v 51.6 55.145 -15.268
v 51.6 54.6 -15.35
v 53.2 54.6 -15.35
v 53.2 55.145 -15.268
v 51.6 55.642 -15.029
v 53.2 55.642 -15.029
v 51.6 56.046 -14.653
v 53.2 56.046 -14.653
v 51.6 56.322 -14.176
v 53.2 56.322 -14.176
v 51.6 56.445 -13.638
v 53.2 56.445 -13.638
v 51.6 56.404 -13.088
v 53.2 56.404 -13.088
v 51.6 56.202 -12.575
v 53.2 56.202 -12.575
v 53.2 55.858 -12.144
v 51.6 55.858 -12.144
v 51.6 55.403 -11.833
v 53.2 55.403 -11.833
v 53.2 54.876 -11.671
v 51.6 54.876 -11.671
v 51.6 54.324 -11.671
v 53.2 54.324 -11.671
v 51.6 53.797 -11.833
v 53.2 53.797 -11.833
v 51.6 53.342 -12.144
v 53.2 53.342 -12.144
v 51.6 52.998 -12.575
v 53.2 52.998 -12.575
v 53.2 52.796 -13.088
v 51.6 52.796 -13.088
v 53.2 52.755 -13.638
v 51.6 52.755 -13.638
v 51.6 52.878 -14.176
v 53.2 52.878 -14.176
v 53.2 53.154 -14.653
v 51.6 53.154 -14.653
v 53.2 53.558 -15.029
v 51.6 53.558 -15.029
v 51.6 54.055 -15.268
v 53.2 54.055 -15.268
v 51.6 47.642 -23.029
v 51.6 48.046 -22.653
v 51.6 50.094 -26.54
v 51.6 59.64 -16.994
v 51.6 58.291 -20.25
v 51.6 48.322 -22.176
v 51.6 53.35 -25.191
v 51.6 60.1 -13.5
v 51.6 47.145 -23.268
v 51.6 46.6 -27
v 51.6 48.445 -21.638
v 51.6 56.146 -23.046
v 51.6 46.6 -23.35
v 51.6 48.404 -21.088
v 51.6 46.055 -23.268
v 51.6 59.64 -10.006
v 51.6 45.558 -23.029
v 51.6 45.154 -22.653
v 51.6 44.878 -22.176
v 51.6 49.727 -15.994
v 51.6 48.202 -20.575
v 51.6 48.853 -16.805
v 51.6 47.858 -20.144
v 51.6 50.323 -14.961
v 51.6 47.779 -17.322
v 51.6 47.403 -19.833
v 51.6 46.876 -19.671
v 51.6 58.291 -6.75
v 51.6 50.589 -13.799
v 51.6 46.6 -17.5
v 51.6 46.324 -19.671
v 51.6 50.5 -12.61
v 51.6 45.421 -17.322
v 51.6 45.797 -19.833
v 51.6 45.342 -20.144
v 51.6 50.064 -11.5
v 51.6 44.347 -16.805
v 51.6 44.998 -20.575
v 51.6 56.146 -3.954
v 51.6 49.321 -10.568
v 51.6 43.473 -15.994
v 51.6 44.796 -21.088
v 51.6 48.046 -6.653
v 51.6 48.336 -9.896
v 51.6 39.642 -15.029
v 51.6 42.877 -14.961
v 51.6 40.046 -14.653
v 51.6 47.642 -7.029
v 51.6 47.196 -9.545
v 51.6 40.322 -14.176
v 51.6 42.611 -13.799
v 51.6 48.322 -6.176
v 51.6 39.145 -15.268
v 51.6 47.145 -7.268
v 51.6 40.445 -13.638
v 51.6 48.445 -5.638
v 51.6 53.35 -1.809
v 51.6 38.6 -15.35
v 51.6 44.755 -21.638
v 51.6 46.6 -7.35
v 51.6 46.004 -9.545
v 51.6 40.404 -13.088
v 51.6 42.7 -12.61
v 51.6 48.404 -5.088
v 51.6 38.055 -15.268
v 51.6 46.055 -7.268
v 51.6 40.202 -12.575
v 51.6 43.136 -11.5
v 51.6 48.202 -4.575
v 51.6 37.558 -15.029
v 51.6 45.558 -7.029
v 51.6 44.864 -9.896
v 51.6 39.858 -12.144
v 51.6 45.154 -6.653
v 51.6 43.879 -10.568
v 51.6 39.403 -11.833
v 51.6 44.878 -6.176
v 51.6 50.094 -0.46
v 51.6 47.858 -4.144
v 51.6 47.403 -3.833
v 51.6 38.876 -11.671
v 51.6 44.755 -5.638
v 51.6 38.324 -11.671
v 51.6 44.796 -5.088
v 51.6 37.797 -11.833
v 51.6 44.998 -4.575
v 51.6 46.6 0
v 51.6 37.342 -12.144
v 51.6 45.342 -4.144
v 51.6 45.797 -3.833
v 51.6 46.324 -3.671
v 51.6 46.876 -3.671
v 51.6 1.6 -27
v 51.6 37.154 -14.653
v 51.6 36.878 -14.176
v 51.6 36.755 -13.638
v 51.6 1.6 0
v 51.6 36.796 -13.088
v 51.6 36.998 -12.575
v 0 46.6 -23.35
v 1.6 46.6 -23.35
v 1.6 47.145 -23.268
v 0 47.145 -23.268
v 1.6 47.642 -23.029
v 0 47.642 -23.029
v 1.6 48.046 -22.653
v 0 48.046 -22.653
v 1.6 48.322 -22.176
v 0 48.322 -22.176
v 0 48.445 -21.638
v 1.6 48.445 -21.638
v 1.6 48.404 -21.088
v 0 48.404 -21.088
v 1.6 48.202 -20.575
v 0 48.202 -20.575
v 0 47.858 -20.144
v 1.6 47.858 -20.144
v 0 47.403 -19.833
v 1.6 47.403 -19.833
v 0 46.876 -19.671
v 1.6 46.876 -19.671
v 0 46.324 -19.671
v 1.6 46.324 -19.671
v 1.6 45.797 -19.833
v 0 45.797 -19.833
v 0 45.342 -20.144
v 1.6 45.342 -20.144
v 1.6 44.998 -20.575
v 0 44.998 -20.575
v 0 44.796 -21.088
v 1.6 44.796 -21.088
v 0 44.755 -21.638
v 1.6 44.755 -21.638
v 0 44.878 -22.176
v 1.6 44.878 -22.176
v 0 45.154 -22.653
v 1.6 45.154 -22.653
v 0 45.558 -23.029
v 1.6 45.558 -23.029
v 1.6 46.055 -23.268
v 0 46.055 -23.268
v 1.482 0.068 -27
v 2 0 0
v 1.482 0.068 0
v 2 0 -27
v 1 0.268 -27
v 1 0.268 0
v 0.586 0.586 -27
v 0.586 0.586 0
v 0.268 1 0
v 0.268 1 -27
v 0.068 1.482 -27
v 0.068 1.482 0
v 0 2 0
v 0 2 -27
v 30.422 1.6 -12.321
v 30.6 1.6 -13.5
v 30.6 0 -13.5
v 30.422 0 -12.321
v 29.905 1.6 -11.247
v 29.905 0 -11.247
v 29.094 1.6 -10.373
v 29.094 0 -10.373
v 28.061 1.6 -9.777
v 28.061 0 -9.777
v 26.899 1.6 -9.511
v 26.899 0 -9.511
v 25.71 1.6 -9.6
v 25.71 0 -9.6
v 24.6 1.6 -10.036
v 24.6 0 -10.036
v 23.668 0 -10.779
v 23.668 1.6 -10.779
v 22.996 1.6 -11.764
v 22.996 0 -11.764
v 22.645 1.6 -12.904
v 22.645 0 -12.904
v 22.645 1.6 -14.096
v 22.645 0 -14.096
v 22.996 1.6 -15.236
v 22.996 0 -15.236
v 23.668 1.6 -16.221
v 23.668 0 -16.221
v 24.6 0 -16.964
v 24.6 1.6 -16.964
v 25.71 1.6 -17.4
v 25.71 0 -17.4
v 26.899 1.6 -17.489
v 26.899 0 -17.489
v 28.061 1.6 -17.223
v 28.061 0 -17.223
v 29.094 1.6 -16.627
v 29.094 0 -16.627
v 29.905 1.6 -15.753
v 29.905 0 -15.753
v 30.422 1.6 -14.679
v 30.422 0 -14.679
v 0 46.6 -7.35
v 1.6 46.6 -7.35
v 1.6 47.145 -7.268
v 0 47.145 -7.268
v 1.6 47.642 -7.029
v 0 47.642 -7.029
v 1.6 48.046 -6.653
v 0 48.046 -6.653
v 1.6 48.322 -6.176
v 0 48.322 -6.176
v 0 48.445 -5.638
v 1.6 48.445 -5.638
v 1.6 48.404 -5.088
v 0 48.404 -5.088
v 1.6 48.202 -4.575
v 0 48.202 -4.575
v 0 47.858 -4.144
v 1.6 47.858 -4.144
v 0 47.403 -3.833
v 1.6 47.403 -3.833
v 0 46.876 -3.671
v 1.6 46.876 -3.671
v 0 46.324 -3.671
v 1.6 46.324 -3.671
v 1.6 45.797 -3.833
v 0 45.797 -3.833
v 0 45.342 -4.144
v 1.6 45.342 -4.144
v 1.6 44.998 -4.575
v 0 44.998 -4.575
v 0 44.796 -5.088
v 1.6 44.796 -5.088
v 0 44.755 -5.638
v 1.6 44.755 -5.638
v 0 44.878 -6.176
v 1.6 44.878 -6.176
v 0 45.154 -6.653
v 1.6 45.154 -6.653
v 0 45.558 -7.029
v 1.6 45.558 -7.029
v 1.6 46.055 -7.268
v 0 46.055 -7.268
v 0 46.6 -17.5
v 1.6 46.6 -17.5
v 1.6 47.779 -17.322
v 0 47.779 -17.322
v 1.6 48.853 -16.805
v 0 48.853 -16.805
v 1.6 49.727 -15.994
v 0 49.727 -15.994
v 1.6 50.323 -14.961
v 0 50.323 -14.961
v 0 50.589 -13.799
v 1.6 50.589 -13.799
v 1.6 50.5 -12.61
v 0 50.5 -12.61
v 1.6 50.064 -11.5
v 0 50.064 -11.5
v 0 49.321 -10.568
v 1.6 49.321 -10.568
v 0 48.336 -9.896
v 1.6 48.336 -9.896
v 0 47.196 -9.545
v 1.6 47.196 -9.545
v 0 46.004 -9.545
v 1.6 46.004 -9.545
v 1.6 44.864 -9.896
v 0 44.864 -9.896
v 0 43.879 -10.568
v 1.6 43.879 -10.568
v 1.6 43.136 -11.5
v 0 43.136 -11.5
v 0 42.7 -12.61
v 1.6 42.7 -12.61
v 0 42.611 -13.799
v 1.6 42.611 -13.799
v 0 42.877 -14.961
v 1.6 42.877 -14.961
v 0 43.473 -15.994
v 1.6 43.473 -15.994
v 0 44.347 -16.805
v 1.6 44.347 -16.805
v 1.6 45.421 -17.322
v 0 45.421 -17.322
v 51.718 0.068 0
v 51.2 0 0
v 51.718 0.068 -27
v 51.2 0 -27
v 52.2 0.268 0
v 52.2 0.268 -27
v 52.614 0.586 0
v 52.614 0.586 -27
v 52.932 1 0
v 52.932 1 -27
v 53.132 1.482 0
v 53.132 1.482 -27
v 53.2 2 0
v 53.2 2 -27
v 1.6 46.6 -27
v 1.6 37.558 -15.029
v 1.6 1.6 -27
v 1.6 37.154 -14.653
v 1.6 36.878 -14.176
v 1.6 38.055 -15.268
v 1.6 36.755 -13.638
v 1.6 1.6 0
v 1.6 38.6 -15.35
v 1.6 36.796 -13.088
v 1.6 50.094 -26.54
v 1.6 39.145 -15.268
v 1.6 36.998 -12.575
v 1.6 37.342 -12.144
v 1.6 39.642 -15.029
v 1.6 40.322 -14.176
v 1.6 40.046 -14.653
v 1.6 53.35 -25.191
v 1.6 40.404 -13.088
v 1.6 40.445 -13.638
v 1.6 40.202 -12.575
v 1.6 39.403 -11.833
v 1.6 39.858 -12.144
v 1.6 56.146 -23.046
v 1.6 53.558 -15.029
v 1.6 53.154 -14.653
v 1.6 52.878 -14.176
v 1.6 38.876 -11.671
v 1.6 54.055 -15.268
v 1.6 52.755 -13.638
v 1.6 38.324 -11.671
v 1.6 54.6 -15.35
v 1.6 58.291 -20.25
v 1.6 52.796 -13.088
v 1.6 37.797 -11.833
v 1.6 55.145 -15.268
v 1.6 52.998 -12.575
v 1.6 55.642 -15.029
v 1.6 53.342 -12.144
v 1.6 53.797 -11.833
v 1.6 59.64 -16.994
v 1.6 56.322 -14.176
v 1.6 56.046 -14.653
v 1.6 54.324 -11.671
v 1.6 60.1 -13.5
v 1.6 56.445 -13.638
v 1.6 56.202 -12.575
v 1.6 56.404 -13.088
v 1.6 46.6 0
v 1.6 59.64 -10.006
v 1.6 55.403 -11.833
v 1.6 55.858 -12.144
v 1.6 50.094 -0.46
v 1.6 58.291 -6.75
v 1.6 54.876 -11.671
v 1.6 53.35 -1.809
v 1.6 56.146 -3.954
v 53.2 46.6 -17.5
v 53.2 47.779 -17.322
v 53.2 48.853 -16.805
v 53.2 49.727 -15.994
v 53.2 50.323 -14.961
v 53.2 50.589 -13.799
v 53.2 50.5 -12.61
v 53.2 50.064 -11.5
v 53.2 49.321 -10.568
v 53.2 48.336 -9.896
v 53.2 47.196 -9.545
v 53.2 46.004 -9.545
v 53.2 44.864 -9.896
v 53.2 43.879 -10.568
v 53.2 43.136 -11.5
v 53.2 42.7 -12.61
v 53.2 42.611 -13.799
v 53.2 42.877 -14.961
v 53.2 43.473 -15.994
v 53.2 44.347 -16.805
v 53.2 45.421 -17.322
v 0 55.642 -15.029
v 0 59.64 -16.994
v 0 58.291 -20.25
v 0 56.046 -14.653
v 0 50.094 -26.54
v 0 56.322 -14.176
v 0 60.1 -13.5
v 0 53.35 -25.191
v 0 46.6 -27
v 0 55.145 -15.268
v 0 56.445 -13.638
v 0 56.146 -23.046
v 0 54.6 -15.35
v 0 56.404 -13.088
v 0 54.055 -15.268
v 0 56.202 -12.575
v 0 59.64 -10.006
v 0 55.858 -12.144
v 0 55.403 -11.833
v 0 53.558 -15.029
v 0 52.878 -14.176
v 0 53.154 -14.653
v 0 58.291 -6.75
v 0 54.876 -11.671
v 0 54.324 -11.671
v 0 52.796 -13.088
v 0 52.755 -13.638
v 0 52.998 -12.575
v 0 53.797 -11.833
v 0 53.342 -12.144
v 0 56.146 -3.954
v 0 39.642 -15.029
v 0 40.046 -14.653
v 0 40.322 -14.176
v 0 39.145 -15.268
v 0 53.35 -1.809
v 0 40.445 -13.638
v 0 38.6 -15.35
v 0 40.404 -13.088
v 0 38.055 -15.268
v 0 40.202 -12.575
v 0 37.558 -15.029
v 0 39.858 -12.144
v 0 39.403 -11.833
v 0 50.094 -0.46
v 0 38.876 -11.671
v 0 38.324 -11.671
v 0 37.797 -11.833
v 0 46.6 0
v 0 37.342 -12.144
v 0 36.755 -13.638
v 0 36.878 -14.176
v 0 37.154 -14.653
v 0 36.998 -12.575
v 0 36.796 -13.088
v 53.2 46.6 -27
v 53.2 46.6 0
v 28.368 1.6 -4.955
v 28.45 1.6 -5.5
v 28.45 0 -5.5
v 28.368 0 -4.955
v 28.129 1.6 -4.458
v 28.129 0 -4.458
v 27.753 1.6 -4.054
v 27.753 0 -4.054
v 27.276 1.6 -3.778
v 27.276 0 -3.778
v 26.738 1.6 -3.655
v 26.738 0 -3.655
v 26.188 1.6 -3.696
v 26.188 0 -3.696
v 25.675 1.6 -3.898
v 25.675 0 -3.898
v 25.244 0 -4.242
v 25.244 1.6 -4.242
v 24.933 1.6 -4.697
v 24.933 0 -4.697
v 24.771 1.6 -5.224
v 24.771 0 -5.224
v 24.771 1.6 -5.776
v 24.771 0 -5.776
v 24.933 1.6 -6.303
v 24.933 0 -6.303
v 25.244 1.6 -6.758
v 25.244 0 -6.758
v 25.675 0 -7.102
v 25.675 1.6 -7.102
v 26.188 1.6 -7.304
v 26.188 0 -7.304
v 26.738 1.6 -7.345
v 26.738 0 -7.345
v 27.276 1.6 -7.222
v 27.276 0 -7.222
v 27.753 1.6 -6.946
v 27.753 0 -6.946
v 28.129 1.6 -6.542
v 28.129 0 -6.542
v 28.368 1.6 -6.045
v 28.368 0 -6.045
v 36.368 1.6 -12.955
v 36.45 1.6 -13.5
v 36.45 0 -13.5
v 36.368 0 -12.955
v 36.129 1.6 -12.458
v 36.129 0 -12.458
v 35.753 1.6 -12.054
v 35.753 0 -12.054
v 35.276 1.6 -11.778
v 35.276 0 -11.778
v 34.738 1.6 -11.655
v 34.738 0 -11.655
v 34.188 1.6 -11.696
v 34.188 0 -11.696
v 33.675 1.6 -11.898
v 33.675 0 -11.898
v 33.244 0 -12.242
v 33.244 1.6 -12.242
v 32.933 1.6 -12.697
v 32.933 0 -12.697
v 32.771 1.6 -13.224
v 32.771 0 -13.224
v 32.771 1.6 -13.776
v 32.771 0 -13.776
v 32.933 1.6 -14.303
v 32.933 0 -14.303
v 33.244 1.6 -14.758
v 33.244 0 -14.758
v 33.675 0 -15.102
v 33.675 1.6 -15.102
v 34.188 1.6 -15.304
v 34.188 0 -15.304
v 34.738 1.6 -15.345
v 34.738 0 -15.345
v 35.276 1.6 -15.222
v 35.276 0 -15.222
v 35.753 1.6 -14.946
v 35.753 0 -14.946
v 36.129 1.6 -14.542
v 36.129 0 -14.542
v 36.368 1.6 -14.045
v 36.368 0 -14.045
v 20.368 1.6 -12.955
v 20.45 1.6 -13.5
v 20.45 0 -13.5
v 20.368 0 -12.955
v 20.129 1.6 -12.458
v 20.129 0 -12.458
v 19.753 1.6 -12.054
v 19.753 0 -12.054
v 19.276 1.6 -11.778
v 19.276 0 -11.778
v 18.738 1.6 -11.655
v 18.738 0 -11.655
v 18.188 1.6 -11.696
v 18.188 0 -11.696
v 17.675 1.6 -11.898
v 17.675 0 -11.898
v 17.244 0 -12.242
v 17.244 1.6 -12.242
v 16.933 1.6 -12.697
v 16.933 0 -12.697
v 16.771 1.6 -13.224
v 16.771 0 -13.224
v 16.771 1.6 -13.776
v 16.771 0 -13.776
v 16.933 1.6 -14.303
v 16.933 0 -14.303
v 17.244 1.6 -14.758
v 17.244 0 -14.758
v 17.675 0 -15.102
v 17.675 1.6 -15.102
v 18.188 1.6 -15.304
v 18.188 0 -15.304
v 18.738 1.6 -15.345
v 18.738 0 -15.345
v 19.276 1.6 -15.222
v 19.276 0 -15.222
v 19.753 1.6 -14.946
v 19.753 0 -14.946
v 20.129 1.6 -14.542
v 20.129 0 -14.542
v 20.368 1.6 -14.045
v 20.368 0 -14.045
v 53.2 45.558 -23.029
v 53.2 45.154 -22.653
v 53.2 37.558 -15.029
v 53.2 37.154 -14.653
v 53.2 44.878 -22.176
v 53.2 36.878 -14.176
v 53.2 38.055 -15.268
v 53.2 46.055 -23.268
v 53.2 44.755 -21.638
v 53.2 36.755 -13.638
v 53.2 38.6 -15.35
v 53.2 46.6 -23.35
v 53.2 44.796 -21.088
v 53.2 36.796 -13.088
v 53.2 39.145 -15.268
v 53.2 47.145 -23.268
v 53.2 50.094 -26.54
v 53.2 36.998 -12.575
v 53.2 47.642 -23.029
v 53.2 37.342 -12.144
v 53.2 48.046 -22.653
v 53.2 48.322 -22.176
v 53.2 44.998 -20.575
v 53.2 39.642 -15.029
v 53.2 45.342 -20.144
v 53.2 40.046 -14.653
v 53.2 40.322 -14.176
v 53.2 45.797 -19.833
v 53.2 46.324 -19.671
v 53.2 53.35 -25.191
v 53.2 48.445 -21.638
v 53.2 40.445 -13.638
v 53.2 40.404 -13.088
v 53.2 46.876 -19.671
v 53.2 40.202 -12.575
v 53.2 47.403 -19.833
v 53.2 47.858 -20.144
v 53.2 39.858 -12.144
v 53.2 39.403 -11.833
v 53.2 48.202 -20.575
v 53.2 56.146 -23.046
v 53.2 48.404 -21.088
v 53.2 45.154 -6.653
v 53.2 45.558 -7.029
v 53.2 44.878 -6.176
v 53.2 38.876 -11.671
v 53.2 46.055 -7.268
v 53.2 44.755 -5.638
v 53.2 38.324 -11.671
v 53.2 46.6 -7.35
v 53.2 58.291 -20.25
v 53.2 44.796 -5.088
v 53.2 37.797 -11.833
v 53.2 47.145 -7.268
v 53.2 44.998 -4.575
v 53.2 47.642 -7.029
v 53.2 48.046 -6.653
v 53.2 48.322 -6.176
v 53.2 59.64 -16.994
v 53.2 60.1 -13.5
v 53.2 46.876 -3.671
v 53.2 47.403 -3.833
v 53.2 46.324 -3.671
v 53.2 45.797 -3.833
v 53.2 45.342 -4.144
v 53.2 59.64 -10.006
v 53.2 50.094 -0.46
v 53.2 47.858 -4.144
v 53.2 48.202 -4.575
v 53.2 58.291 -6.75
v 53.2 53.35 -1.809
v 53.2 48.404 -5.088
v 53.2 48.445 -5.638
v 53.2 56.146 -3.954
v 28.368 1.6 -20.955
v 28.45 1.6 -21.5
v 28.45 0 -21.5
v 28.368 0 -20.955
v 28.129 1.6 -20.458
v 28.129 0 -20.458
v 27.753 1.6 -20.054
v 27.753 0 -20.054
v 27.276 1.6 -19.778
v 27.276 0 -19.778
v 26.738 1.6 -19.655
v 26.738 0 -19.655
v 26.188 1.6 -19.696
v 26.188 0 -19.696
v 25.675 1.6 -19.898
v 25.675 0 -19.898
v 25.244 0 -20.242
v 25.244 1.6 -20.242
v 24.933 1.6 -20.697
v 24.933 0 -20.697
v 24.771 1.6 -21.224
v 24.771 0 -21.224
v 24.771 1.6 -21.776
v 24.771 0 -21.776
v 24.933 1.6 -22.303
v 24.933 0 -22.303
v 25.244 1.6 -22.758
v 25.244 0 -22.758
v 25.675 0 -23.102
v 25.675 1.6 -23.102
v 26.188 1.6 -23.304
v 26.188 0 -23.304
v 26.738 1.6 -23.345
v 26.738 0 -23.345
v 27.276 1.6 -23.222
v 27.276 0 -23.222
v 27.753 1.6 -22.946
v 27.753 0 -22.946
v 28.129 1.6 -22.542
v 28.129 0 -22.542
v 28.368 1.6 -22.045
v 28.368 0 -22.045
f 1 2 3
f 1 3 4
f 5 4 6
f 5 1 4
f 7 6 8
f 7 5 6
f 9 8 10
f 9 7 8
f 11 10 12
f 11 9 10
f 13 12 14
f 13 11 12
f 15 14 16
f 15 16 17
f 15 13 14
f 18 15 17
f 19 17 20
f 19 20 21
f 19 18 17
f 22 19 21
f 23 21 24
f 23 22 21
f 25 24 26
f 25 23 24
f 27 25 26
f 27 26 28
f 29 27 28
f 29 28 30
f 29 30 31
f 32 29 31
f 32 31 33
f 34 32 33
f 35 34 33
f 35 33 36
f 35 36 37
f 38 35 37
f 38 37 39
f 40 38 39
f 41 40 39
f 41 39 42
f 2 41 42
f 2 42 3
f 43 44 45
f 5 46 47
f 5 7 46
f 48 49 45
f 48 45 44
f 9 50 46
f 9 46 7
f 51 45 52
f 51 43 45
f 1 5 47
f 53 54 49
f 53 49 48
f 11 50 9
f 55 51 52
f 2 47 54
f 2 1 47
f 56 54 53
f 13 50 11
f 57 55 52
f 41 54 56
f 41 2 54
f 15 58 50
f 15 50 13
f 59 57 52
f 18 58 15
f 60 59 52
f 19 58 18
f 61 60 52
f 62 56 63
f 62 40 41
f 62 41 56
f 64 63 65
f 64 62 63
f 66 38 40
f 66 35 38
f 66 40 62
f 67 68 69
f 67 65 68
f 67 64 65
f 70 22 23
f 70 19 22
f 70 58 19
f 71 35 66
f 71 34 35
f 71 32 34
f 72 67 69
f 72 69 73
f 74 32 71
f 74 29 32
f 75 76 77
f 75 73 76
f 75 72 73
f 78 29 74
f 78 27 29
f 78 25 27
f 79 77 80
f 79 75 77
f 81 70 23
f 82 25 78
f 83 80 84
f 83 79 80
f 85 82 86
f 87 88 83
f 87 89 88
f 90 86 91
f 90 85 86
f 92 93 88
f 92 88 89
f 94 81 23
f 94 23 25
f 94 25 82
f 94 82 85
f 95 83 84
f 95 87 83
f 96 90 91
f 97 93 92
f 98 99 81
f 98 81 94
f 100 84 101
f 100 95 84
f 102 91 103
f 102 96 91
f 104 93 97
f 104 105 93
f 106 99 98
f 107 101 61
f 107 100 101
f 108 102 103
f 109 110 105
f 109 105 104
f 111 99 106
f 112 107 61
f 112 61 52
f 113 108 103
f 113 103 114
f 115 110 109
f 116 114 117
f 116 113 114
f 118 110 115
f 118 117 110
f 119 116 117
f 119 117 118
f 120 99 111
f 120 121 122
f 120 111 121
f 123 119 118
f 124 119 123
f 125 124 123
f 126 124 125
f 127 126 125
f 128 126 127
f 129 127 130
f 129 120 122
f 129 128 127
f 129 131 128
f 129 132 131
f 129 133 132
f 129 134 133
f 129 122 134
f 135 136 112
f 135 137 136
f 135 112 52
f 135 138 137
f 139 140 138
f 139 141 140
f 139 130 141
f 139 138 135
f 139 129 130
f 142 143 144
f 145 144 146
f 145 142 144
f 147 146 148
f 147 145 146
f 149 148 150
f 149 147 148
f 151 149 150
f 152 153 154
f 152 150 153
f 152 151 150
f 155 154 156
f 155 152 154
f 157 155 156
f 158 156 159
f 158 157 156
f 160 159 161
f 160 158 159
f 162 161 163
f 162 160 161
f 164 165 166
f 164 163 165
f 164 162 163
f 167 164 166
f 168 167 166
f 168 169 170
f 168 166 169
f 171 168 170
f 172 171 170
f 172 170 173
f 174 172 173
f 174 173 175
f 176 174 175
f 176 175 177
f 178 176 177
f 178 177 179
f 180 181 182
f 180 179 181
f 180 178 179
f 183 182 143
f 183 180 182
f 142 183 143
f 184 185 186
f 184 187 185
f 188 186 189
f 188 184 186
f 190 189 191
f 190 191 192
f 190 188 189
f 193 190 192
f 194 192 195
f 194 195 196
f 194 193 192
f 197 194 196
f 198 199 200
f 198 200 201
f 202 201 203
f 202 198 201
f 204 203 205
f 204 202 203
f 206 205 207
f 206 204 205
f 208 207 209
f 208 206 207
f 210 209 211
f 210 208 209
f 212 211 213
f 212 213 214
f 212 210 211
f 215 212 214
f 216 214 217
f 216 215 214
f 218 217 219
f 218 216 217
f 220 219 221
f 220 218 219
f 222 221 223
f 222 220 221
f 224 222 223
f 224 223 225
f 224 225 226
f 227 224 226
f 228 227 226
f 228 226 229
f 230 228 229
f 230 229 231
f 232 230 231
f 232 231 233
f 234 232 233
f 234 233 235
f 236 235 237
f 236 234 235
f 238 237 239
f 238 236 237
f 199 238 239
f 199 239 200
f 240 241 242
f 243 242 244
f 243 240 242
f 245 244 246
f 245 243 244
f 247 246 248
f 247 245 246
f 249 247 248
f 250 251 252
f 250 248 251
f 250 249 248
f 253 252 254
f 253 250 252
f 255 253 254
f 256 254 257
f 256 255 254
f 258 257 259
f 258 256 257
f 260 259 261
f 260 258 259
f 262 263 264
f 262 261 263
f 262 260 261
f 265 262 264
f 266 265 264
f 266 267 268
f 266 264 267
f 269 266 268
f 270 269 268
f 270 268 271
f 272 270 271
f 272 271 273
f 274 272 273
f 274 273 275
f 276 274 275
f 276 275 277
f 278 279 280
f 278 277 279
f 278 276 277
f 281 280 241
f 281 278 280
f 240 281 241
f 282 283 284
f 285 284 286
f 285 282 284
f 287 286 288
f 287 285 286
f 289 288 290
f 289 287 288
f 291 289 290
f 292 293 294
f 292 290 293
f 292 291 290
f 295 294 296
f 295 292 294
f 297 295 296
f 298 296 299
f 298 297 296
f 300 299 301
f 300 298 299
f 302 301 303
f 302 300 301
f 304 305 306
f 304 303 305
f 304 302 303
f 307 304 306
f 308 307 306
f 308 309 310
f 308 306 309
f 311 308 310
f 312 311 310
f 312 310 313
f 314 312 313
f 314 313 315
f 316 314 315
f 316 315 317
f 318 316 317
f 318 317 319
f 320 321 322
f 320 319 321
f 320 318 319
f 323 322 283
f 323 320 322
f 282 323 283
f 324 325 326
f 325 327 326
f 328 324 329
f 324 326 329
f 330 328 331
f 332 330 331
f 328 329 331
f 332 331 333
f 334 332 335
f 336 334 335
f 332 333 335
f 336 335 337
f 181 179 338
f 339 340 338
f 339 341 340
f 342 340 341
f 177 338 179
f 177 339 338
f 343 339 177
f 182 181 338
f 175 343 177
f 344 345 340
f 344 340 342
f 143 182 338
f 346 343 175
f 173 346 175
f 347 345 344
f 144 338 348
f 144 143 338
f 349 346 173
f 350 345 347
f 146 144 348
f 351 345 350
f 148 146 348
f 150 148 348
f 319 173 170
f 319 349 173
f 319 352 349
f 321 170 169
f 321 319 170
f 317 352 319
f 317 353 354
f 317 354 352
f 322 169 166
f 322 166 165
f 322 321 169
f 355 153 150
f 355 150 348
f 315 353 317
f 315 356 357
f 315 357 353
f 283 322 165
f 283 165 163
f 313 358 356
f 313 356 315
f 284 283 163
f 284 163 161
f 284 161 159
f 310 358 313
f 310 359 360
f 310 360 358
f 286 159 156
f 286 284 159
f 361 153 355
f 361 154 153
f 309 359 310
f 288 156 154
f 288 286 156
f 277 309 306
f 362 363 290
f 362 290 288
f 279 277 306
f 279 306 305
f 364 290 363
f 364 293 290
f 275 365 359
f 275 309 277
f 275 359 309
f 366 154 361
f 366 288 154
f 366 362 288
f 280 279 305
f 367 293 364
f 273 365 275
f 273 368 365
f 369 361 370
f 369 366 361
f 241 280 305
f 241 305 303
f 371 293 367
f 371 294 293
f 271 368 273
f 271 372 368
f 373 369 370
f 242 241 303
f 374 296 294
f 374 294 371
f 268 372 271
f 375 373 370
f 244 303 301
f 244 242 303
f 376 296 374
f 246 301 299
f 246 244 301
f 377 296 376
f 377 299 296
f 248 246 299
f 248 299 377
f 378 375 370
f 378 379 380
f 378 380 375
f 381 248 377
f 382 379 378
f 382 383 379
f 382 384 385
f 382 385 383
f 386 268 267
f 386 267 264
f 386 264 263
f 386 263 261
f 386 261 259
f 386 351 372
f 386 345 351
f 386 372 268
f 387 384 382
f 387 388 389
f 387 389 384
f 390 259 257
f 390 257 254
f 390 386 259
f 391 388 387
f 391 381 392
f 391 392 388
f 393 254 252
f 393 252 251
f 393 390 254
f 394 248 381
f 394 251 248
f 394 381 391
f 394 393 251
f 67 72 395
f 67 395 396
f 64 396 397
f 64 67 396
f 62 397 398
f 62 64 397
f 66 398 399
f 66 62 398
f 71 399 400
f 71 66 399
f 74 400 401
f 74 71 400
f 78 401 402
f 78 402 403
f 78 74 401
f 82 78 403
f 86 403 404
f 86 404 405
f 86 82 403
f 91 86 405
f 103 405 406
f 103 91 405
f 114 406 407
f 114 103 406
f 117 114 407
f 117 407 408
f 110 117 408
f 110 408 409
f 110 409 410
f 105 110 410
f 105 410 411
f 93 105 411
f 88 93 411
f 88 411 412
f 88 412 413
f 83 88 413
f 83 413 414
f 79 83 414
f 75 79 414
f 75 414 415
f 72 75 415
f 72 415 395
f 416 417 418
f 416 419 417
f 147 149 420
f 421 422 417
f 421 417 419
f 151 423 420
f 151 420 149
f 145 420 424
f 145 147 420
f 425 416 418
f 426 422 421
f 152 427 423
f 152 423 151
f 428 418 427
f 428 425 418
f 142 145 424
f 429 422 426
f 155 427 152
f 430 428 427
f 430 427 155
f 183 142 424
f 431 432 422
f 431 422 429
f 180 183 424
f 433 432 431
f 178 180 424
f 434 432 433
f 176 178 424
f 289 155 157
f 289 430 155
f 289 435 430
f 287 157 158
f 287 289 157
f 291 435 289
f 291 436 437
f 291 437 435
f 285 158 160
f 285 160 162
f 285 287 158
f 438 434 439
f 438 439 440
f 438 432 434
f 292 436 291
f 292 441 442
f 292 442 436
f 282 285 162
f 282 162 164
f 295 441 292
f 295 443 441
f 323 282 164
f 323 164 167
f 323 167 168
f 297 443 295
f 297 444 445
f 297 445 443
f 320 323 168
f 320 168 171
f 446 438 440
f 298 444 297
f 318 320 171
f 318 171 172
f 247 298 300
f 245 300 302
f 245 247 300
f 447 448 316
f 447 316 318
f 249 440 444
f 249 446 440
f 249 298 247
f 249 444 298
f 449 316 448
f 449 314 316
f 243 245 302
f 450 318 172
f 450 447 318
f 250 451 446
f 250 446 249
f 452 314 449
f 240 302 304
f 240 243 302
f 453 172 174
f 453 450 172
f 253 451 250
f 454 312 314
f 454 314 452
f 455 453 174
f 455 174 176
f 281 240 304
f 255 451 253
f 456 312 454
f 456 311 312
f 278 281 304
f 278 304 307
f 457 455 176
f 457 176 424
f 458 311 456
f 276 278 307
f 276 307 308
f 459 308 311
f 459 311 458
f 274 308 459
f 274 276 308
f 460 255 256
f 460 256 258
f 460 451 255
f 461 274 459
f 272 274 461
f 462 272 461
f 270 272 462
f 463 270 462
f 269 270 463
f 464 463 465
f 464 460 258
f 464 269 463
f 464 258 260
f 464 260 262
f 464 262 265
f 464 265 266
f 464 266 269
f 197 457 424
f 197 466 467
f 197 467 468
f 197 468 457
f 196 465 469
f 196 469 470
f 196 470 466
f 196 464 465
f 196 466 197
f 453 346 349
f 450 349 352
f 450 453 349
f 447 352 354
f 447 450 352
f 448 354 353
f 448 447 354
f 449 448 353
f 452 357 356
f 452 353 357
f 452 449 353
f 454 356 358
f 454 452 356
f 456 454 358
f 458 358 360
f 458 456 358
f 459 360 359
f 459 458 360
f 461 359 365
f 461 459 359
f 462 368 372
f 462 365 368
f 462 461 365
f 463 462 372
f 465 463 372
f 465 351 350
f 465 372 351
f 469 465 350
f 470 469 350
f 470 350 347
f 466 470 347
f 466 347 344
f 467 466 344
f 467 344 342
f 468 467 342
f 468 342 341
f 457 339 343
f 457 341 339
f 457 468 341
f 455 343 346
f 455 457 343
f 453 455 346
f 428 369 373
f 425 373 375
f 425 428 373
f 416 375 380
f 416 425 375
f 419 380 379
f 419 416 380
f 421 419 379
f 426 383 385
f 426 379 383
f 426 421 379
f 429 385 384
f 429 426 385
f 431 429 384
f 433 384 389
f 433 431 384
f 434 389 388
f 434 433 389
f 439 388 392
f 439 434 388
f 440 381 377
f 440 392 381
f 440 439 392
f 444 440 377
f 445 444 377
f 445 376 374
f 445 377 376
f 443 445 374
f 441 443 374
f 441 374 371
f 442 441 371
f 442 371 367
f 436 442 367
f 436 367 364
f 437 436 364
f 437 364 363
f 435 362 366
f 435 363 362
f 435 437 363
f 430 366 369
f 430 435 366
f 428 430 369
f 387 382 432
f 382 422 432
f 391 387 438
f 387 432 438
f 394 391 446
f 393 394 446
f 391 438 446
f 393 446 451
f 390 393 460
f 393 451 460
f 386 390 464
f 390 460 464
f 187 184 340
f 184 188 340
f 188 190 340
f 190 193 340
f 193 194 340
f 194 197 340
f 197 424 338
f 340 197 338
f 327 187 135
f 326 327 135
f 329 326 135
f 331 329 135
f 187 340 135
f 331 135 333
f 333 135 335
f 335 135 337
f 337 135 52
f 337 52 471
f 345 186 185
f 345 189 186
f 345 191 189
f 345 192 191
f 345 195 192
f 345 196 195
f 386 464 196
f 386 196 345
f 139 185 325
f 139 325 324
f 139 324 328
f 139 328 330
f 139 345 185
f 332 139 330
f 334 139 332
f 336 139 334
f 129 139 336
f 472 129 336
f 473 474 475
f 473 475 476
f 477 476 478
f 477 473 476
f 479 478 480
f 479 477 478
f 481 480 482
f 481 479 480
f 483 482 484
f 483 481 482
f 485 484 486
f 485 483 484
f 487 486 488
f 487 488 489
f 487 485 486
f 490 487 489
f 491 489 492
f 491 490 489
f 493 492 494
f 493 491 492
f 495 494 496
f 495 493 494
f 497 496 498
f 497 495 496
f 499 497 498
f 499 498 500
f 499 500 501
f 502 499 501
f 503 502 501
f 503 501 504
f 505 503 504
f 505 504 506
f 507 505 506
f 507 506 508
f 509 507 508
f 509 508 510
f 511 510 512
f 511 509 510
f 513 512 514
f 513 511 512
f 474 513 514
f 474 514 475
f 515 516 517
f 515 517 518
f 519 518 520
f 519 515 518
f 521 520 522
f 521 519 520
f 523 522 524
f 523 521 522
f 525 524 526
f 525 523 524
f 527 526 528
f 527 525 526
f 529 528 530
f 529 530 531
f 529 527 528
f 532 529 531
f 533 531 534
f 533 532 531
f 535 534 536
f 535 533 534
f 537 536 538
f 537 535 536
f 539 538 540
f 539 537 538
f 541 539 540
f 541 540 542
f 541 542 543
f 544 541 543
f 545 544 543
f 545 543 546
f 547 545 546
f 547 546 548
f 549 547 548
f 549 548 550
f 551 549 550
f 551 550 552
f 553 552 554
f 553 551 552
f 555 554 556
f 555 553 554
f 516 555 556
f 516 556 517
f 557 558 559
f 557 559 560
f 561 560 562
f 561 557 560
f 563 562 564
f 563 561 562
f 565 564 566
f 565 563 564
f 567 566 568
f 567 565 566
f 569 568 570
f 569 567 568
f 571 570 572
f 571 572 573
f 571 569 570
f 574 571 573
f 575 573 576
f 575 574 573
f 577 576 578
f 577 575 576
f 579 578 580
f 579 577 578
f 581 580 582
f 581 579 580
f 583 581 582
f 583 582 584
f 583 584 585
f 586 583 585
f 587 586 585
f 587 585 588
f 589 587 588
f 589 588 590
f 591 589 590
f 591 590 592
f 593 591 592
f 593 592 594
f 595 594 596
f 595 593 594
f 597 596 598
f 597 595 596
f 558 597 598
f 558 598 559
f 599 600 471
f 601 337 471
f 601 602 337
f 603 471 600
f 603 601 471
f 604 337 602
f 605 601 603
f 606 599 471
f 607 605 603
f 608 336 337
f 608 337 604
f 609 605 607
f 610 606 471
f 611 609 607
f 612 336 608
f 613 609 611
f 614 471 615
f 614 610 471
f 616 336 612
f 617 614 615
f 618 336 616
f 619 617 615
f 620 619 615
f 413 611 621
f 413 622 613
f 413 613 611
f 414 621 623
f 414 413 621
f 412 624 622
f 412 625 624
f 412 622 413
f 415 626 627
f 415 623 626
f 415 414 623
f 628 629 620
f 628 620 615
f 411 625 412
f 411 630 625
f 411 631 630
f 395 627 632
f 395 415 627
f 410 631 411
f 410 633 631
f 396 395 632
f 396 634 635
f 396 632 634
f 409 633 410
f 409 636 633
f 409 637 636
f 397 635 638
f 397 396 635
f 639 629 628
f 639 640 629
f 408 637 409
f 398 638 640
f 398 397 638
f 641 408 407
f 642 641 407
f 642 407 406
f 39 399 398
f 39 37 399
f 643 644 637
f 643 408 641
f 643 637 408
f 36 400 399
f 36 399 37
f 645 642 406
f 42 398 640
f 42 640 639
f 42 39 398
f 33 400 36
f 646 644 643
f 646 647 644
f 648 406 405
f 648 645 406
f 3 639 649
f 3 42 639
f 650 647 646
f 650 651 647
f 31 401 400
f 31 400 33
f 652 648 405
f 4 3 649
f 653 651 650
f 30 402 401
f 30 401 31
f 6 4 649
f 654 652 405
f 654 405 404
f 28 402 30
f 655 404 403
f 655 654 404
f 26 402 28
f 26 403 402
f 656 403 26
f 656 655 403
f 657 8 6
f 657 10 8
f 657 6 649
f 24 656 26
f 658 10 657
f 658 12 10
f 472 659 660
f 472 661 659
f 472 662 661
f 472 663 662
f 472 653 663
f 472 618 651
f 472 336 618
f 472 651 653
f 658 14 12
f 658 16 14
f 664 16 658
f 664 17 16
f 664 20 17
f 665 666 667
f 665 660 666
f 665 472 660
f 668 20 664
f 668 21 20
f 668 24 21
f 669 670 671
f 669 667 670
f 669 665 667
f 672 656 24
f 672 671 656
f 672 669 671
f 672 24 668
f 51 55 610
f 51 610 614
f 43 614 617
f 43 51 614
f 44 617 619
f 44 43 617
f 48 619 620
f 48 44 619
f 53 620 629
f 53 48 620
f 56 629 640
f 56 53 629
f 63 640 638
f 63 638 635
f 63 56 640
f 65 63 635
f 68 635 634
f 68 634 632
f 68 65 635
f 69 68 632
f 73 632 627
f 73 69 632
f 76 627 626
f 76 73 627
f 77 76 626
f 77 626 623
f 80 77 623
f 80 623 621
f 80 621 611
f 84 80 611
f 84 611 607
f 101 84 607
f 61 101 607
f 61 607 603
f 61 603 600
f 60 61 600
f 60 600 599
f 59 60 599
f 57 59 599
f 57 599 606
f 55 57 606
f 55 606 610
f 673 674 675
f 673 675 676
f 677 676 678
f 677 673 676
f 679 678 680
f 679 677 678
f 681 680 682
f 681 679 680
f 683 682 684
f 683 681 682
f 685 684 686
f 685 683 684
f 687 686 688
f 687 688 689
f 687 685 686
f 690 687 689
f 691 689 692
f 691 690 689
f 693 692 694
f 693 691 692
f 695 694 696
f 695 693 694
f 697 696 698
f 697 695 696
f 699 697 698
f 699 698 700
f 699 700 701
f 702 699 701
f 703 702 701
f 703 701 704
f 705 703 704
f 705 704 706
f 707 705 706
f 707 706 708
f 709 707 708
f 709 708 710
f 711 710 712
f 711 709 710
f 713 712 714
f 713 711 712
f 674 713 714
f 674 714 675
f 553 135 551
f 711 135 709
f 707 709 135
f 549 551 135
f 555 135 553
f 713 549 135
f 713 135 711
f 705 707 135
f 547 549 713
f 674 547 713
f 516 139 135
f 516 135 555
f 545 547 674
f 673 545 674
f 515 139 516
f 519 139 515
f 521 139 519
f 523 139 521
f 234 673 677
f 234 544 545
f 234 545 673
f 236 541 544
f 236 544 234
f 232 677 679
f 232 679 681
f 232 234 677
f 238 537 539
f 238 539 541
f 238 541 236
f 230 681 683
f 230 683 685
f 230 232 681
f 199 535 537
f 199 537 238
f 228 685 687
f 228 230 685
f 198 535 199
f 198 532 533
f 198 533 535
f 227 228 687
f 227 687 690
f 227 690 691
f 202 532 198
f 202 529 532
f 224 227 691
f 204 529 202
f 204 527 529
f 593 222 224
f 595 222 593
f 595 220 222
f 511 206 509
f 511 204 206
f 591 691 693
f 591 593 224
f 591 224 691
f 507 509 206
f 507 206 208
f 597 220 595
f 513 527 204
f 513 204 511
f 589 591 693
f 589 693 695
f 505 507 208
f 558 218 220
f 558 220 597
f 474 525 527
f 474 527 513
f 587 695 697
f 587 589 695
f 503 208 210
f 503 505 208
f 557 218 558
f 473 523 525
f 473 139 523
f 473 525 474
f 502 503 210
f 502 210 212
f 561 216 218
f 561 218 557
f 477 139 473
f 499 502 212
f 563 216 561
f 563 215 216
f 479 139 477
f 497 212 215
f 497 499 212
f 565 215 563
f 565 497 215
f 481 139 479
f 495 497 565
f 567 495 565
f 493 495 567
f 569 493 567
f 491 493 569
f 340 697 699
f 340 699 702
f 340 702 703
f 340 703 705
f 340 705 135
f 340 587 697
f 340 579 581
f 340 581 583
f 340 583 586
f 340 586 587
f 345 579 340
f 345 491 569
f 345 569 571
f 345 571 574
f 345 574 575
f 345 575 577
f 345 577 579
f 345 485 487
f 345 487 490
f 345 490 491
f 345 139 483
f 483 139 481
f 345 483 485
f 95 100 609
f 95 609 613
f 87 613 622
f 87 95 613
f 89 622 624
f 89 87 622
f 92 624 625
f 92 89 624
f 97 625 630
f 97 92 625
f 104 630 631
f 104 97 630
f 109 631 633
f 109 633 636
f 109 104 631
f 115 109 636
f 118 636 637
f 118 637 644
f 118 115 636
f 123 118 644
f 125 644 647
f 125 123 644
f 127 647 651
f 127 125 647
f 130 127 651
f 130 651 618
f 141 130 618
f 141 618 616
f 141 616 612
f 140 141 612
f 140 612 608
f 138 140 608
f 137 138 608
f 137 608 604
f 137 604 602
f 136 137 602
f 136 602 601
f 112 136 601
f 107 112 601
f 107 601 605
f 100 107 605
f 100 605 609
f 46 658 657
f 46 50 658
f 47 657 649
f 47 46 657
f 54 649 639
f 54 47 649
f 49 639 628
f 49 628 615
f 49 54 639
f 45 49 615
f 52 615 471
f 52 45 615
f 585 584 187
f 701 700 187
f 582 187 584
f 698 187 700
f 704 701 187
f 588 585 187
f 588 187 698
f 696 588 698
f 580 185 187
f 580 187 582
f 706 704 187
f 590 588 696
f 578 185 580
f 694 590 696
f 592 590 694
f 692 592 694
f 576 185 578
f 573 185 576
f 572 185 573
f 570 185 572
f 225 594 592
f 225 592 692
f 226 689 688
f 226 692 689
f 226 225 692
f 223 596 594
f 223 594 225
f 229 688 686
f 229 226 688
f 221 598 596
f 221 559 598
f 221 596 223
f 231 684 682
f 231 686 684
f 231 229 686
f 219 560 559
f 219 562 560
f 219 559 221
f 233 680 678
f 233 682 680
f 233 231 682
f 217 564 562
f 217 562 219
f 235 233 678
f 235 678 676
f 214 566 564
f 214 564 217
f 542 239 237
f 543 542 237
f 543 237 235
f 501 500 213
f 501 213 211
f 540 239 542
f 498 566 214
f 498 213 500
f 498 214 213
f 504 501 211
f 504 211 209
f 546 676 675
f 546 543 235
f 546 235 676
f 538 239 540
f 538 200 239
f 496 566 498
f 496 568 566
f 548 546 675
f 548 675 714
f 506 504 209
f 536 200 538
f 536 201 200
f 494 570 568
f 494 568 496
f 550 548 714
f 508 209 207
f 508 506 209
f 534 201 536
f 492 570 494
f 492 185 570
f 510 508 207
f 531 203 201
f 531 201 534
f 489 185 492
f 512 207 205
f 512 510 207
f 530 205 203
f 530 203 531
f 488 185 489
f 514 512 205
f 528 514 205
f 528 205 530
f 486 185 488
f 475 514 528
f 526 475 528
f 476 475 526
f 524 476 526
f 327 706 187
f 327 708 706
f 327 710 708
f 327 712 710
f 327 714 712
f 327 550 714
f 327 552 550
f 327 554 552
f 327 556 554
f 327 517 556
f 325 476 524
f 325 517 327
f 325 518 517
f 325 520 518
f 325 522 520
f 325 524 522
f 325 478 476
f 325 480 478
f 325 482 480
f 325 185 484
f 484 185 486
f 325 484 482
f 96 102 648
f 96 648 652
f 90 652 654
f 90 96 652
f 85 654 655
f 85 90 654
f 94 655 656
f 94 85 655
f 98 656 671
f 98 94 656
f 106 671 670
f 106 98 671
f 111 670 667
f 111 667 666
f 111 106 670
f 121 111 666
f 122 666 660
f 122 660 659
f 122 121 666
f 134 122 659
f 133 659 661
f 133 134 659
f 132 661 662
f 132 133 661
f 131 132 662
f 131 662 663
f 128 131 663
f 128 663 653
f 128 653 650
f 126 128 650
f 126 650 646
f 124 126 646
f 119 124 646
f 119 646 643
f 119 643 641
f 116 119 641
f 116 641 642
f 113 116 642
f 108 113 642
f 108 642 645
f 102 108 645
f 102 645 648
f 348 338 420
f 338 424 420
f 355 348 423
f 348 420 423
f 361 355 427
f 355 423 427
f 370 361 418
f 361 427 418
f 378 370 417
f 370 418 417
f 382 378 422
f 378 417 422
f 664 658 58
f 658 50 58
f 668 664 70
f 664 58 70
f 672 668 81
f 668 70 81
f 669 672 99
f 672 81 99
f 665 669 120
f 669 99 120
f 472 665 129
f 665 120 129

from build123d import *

# Parameters (mm, degrees)
EXTRUDE1_DEPTH           = 27
FILLET2_R                = 13.5
FILLET3_R                = 13.5
FILLET4_R                = 13.5
FILLET5_R                = 13.5
CUT_EXTRUDE1_START       = -53.2
CUT_EXTRUDE1_OUTLINE_R   = 4
CUT_EXTRUDE1_OUTLINE_R_2 = 1.85
CUT_EXTRUDE1_DEPTH       = 53.2
CUT_EXTRUDE2_START       = -1.6
CUT_EXTRUDE2_OUTLINE_R   = 4
CUT_EXTRUDE2_OUTLINE_R_2 = 1.85
CUT_EXTRUDE2_DEPTH       = 1.6
FILLET6_R                = 2
FILLET7_R                = 2


# Read off the part's stored shape, not the designer's step: Cut-Extrude1, Cut-Extrude2
with BuildPart() as part:
    # Sketch1 → Extrude1 (new body)
    with BuildSketch(Plane.XY):
        Polygon((0, 0), (53.2, 0), (53.2, 60.1), (51.6, 60.1), (51.6, 1.6), (1.6, 1.6), (1.6, 60.1), (0, 60.1), align=None)
    extrude(amount=-EXTRUDE1_DEPTH)

    # Fillet2
    fillet2_edges = [part.edges().sort_by_distance(p)[0] for p in [
        (52.4, 60.1, 0),
    ]]
    fillet(fillet2_edges, radius=FILLET2_R)

    # Fillet3
    fillet3_edges = [part.edges().sort_by_distance(p)[0] for p in [
        (52.4, 60.1, -27),
    ]]
    fillet(fillet3_edges, radius=FILLET3_R - 0.0001)  # a hair under: the kernel refuses the full size

    # Fillet4
    fillet4_edges = [part.edges().sort_by_distance(p)[0] for p in [
        (0.8, 60.1, -27),
    ]]
    fillet(fillet4_edges, radius=FILLET4_R)

    # Fillet5
    fillet5_edges = [part.edges().sort_by_distance(p)[0] for p in [
        (0.8, 60.1, 0),
    ]]
    fillet(fillet5_edges, radius=FILLET5_R - 0.0001)  # a hair under: the kernel refuses the full size

    # Cut-Extrude1 outline → Cut-Extrude1 (cut)
    with BuildSketch(Plane(origin=(53.2, 0, 0), x_dir=(0, 0, -1), z_dir=(1, 0, 0)).offset(CUT_EXTRUDE1_START)):
        with Locations((13.5, 46.6)):
            Circle(CUT_EXTRUDE1_OUTLINE_R)
        with Locations((21.5, 46.6)):
            Circle(CUT_EXTRUDE1_OUTLINE_R_2)
        with Locations((5.5, 46.6)):
            Circle(CUT_EXTRUDE1_OUTLINE_R_2)
        with Locations((13.5, 38.6)):
            Circle(CUT_EXTRUDE1_OUTLINE_R_2)
        with Locations((13.5, 54.6)):
            Circle(CUT_EXTRUDE1_OUTLINE_R_2)
    extrude(amount=CUT_EXTRUDE1_DEPTH, mode=Mode.SUBTRACT)

    # Cut-Extrude2 outline → Cut-Extrude2 (cut)
    with BuildSketch(Plane.XZ.offset(CUT_EXTRUDE2_START)):
        with Locations((26.6, -13.5)):
            Circle(CUT_EXTRUDE2_OUTLINE_R)
        with Locations((34.6, -13.5)):
            Circle(CUT_EXTRUDE2_OUTLINE_R_2)
        with Locations((18.6, -13.5)):
            Circle(CUT_EXTRUDE2_OUTLINE_R_2)
        with Locations((26.6, -21.5)):
            Circle(CUT_EXTRUDE2_OUTLINE_R_2)
        with Locations((26.6, -5.5)):
            Circle(CUT_EXTRUDE2_OUTLINE_R_2)
    extrude(amount=CUT_EXTRUDE2_DEPTH, mode=Mode.SUBTRACT)

    # Fillet6
    fillet6_edges = [part.edges().sort_by_distance(p)[0] for p in [
        (53.2, 0, -13.5),
    ]]
    fillet(fillet6_edges, radius=FILLET6_R)

    # Fillet7
    fillet7_edges = [part.edges().sort_by_distance(p)[0] for p in [
        (0, 0, -13.5),
    ]]
    fillet(fillet7_edges, radius=FILLET7_R)


solid = part.part
